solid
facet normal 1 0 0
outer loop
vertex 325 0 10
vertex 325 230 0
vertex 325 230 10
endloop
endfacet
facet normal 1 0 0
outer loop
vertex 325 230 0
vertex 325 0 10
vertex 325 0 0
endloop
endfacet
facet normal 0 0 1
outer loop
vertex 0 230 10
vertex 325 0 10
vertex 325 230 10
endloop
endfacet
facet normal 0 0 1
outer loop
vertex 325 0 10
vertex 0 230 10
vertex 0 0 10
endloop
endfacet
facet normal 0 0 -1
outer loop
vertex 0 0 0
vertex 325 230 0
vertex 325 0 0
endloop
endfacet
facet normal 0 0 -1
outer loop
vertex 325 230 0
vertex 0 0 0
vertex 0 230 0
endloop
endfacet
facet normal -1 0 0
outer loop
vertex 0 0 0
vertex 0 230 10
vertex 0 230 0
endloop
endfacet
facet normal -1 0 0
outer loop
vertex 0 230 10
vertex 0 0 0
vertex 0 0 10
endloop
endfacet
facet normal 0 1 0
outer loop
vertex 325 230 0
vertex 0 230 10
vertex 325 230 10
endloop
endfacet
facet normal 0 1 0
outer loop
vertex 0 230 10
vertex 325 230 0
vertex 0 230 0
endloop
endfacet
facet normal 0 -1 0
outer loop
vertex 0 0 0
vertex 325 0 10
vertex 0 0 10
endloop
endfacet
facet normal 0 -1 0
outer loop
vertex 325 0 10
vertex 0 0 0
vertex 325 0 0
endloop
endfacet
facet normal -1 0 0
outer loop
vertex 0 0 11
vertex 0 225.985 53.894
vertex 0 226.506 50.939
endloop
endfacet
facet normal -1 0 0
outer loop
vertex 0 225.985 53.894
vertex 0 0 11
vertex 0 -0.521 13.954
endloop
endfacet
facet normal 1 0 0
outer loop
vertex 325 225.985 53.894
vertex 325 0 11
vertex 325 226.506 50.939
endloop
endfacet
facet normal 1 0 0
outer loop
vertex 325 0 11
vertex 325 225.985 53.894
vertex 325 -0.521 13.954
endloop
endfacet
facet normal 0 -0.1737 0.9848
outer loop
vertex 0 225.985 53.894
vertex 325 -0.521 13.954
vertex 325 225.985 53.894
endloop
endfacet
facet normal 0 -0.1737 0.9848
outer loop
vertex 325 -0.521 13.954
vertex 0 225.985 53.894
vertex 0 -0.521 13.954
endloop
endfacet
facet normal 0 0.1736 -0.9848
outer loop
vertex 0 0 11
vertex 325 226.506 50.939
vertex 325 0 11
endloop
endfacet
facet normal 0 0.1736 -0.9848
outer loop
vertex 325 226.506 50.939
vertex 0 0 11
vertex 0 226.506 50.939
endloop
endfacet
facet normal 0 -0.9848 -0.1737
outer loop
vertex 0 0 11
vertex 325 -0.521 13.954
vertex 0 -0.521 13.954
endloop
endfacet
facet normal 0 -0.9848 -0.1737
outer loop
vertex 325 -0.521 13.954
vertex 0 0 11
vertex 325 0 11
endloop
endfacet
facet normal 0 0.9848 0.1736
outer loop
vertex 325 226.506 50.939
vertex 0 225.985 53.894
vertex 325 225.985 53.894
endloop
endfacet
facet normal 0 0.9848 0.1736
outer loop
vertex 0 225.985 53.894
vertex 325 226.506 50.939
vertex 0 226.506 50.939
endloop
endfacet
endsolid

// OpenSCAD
// file: params_laptop.scad
// Author: Mihai Oltean, https://mihaioltean.github.io, mihai.oltean@gmail.com
// More details: https://jenny5.org, https://jenny5-robot.github.io/
// Source code: github.com/jenny5-robot
// MIT License
//--------------------------------------------------------------

laptop13_size = [325, 230, 10];
// main file
// Author: Mihai Oltean, https://mihaioltean.github.io, mihai.oltean@gmail.com
// More details: https://jenny5.org, https://jenny5-robot.github.io/
// Source code: github.com/jenny5-robot
// MIT License
//--------------------------------------------------------------
include <params_laptop.scad>

module laptop13(lid_angle = 10)
{
    color ("LightCyan") cube(laptop13_size);
    color ("LightCyan") translate ([0, 0, laptop13_size[2] + 1]) rotate ([lid_angle, 0, 0]) cube([laptop13_size[0], laptop13_size[1], 3]);
}

laptop13(10);
